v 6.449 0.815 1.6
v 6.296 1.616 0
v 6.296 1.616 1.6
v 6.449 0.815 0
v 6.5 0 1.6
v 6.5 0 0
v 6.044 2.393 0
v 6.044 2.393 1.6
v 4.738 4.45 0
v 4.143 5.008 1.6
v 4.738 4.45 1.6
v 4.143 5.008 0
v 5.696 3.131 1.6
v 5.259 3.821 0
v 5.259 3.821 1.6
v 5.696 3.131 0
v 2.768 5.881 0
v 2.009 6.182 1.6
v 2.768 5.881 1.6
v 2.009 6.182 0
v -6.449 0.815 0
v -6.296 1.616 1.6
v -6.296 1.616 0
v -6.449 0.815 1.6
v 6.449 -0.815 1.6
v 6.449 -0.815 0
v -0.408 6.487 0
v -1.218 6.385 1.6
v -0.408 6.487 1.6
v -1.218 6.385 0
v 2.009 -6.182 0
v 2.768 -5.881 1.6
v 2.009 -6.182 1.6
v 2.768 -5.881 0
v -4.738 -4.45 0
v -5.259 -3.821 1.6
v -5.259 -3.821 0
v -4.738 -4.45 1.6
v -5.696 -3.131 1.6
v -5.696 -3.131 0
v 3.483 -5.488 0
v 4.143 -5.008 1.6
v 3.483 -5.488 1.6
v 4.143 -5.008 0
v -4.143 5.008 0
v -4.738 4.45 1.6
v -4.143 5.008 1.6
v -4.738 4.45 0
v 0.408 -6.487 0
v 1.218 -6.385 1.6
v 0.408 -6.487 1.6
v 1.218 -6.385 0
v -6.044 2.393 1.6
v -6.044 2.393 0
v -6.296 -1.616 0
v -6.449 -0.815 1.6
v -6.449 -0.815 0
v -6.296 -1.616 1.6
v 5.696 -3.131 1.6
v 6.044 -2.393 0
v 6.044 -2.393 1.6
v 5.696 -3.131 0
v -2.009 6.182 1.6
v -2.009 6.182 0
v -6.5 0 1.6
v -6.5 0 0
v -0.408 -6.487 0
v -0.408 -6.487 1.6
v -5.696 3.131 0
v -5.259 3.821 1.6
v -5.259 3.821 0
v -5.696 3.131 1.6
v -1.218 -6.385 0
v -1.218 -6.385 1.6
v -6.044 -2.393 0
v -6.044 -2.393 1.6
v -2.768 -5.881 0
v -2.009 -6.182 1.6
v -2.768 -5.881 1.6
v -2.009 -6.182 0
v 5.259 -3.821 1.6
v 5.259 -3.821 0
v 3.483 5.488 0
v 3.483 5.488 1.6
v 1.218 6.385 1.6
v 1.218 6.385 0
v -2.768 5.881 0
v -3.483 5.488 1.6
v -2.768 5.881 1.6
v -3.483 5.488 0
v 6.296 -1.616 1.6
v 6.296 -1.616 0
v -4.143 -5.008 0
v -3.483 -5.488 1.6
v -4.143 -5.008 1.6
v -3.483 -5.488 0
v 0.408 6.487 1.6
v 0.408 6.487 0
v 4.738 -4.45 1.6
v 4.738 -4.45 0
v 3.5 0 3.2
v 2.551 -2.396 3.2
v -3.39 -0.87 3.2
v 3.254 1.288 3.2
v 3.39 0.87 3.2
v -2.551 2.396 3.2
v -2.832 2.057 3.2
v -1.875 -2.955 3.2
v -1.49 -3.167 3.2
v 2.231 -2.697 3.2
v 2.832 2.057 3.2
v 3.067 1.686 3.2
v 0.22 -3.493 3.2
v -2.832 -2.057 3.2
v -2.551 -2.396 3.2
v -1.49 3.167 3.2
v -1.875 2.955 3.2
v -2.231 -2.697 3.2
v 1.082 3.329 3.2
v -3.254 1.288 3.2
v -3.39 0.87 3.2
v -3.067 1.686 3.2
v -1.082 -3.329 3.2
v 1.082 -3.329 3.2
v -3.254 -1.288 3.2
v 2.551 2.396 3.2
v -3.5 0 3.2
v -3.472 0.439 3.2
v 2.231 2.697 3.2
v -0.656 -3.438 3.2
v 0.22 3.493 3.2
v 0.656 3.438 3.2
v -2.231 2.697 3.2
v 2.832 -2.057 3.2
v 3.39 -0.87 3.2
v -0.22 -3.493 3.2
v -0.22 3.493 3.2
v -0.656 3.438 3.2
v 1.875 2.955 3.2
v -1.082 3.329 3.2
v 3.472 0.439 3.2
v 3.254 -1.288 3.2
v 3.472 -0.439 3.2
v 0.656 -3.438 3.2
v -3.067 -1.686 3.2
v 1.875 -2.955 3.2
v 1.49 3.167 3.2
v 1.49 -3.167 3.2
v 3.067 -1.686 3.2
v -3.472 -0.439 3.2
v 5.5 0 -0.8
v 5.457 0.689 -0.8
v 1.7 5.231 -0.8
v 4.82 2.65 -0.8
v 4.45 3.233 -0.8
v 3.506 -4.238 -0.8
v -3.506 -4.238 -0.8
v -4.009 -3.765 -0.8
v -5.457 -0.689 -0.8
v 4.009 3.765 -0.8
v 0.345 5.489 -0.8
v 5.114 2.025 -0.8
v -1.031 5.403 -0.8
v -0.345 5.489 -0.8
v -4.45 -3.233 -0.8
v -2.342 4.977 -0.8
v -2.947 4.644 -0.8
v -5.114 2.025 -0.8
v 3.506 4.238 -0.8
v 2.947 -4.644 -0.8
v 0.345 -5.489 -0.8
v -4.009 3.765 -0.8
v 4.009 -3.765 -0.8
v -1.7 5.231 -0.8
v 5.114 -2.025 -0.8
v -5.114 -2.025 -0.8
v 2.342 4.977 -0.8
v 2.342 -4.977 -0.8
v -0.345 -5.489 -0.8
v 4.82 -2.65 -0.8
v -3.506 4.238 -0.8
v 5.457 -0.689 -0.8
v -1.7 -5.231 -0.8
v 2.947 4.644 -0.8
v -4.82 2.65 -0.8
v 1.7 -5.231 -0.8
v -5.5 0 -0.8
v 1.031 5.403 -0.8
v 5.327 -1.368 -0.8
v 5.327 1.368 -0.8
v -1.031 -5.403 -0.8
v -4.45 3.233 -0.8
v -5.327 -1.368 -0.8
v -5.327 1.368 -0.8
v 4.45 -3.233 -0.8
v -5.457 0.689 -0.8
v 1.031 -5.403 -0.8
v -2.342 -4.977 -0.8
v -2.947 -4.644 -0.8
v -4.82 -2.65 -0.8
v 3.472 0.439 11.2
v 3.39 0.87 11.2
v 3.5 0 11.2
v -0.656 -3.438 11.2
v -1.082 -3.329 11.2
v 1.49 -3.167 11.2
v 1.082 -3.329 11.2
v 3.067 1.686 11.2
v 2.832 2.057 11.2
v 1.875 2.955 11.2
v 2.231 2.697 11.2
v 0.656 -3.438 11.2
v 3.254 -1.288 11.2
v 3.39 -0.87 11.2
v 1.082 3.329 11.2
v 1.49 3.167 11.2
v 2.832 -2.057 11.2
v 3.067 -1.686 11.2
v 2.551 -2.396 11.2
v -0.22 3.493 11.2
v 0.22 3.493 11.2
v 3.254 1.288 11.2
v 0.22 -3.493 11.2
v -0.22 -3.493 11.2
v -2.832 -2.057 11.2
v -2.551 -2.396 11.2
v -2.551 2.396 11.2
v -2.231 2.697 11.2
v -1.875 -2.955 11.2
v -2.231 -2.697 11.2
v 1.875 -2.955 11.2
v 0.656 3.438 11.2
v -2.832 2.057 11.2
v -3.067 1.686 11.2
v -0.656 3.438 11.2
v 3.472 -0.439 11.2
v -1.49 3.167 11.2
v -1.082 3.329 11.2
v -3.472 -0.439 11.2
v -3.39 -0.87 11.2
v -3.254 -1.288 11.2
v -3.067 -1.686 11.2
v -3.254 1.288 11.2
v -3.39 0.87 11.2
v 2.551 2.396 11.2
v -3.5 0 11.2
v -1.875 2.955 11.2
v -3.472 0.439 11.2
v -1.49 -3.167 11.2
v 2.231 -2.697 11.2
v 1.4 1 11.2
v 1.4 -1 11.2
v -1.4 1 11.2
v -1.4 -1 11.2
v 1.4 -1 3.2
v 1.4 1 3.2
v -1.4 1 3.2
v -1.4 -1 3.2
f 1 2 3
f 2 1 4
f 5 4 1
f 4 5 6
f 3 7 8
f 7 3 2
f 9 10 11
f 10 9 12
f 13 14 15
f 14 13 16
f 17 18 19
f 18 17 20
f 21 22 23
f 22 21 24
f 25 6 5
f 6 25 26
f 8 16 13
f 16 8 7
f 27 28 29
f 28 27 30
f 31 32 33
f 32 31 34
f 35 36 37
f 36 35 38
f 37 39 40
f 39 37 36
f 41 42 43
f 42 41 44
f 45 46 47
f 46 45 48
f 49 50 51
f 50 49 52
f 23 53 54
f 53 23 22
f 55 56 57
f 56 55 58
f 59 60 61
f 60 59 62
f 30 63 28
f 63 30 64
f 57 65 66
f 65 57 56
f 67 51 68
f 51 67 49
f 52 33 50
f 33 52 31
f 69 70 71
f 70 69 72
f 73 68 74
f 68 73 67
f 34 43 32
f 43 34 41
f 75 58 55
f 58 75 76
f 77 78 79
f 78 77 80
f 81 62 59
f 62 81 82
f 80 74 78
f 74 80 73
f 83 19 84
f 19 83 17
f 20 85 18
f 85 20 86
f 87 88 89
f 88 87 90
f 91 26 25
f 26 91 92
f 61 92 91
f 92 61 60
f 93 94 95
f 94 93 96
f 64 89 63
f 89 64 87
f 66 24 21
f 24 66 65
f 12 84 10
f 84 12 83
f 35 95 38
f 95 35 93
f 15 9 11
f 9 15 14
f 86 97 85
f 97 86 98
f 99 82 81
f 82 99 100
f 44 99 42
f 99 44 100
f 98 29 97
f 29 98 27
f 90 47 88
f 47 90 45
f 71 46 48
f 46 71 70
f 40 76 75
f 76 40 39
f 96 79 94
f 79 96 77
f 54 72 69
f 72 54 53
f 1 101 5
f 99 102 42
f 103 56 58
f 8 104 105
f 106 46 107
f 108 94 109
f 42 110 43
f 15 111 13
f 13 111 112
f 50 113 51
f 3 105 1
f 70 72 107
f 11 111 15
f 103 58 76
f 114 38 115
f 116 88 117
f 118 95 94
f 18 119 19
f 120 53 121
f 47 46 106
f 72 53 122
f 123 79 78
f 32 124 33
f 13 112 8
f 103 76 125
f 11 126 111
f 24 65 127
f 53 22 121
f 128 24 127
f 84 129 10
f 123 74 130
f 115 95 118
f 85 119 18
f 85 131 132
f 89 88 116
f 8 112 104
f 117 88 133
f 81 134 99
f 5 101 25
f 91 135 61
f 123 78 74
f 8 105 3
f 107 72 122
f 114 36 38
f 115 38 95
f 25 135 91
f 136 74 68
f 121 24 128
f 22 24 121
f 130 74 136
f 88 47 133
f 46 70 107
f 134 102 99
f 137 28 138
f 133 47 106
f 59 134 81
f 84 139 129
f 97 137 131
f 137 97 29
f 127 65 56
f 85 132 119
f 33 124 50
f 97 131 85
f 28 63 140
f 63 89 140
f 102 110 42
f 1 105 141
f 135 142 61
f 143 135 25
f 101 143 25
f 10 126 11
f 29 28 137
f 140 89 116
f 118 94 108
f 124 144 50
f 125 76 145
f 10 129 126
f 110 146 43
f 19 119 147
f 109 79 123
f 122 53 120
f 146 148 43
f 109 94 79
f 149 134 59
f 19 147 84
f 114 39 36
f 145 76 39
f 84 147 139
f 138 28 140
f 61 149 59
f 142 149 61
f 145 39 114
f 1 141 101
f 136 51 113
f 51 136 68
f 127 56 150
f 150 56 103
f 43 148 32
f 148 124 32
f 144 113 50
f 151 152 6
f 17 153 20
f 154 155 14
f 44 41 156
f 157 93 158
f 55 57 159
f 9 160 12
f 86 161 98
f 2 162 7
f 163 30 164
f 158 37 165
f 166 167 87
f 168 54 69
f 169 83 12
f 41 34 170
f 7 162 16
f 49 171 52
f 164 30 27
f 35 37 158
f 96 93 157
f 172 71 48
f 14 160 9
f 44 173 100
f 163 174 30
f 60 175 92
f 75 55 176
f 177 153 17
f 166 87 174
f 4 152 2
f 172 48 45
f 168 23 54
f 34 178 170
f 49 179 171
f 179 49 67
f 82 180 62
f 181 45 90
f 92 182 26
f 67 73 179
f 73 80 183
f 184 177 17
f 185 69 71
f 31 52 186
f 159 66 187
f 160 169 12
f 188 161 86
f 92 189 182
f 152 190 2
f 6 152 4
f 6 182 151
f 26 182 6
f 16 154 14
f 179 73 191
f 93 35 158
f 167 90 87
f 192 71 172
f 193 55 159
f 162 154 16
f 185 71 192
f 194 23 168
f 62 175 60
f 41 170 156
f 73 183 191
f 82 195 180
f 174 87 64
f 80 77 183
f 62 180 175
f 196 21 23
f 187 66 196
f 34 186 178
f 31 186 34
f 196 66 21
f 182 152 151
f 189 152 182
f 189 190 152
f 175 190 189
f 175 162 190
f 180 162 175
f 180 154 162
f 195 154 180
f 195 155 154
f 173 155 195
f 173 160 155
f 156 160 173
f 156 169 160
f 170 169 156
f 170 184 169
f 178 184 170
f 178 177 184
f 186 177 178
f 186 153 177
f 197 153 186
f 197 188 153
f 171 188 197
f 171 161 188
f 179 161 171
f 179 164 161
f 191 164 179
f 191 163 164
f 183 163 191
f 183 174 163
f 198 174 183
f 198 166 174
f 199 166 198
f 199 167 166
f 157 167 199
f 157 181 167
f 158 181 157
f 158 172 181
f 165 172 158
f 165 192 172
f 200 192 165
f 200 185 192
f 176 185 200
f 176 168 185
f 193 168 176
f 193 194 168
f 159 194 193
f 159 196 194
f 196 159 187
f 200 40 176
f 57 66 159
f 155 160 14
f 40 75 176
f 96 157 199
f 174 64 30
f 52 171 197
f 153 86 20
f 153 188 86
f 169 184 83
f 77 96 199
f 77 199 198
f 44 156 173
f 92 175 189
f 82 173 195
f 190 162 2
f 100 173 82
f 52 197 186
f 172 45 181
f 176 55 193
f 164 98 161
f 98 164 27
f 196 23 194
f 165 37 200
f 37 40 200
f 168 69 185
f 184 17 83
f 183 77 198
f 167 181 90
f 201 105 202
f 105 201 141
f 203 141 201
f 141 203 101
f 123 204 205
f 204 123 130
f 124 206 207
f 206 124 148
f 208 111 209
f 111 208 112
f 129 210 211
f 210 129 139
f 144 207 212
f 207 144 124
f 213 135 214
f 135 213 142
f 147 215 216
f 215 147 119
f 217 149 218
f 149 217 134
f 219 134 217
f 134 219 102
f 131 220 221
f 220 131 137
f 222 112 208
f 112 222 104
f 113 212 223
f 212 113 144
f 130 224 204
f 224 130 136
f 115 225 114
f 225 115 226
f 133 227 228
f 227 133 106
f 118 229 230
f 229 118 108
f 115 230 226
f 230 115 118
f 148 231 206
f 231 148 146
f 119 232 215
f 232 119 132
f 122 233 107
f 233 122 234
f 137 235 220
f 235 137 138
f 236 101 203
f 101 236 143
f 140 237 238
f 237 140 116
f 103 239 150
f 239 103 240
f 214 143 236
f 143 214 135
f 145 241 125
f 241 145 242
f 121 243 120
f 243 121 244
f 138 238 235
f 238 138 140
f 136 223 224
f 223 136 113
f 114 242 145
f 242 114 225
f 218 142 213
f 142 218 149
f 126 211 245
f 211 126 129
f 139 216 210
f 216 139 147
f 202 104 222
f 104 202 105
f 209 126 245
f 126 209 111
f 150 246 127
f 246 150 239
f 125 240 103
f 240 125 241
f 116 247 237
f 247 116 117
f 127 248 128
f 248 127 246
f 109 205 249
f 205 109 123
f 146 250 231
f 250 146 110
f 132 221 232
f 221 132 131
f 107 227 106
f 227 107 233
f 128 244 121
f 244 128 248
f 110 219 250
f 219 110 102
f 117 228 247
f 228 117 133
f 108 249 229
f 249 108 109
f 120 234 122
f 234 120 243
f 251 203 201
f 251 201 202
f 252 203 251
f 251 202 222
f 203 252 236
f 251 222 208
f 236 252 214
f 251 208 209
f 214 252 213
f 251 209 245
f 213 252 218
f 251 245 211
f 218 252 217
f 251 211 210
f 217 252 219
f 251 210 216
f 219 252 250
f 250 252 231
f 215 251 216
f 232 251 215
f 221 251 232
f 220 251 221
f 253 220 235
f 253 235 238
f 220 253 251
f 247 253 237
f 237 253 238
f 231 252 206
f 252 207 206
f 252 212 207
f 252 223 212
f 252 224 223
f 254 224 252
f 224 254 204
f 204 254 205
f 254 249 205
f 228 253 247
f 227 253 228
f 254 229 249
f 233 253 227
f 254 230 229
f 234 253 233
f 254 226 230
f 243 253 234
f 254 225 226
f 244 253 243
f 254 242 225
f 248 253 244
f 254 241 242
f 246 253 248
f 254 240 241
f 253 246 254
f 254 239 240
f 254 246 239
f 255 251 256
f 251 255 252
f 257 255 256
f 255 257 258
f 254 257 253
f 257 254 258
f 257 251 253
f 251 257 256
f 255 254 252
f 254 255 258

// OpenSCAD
//makes a hollow cylinder
module cylshell(r,h,t){
r2 =  r-t;

difference() {
	cylinder(r = r, h = h, center = true);
	cylinder(r = r2, h = h+1, center = true);
	}
}


module pad(includebuttom){

$fn=50;

d1=13;
//d2=10;

d2=7;

d3=11;

h1=8;
h2=8;
h3=1.6;
h4=1.6;
h5=0.8;

w1=2;
w2=1.2;

wfudge=0.8;

difference(){

union(){

	if(includebuttom)
	{
		cylinder(r = d1/2, h = h4, center = false);
		
		translate([0,0,h4])
		cylinder(r1 = d1/2, r2=d2/2,h = h3, center = false);
		
		translate([0,0,-h5])
		cylinder(r1 = d3/2, r2=d1/2,h = h5, center = false);
		
	}

	translate([0,0,h4+h3])
	cylinder(r = d2/2,h = h2, center = false);
	
	}
	

	translate([0,0,h4+h3+h2-h1/2])
	cube([w1+wfudge,w2+wfudge, h1], center = true);
	}

}

pad(true);
